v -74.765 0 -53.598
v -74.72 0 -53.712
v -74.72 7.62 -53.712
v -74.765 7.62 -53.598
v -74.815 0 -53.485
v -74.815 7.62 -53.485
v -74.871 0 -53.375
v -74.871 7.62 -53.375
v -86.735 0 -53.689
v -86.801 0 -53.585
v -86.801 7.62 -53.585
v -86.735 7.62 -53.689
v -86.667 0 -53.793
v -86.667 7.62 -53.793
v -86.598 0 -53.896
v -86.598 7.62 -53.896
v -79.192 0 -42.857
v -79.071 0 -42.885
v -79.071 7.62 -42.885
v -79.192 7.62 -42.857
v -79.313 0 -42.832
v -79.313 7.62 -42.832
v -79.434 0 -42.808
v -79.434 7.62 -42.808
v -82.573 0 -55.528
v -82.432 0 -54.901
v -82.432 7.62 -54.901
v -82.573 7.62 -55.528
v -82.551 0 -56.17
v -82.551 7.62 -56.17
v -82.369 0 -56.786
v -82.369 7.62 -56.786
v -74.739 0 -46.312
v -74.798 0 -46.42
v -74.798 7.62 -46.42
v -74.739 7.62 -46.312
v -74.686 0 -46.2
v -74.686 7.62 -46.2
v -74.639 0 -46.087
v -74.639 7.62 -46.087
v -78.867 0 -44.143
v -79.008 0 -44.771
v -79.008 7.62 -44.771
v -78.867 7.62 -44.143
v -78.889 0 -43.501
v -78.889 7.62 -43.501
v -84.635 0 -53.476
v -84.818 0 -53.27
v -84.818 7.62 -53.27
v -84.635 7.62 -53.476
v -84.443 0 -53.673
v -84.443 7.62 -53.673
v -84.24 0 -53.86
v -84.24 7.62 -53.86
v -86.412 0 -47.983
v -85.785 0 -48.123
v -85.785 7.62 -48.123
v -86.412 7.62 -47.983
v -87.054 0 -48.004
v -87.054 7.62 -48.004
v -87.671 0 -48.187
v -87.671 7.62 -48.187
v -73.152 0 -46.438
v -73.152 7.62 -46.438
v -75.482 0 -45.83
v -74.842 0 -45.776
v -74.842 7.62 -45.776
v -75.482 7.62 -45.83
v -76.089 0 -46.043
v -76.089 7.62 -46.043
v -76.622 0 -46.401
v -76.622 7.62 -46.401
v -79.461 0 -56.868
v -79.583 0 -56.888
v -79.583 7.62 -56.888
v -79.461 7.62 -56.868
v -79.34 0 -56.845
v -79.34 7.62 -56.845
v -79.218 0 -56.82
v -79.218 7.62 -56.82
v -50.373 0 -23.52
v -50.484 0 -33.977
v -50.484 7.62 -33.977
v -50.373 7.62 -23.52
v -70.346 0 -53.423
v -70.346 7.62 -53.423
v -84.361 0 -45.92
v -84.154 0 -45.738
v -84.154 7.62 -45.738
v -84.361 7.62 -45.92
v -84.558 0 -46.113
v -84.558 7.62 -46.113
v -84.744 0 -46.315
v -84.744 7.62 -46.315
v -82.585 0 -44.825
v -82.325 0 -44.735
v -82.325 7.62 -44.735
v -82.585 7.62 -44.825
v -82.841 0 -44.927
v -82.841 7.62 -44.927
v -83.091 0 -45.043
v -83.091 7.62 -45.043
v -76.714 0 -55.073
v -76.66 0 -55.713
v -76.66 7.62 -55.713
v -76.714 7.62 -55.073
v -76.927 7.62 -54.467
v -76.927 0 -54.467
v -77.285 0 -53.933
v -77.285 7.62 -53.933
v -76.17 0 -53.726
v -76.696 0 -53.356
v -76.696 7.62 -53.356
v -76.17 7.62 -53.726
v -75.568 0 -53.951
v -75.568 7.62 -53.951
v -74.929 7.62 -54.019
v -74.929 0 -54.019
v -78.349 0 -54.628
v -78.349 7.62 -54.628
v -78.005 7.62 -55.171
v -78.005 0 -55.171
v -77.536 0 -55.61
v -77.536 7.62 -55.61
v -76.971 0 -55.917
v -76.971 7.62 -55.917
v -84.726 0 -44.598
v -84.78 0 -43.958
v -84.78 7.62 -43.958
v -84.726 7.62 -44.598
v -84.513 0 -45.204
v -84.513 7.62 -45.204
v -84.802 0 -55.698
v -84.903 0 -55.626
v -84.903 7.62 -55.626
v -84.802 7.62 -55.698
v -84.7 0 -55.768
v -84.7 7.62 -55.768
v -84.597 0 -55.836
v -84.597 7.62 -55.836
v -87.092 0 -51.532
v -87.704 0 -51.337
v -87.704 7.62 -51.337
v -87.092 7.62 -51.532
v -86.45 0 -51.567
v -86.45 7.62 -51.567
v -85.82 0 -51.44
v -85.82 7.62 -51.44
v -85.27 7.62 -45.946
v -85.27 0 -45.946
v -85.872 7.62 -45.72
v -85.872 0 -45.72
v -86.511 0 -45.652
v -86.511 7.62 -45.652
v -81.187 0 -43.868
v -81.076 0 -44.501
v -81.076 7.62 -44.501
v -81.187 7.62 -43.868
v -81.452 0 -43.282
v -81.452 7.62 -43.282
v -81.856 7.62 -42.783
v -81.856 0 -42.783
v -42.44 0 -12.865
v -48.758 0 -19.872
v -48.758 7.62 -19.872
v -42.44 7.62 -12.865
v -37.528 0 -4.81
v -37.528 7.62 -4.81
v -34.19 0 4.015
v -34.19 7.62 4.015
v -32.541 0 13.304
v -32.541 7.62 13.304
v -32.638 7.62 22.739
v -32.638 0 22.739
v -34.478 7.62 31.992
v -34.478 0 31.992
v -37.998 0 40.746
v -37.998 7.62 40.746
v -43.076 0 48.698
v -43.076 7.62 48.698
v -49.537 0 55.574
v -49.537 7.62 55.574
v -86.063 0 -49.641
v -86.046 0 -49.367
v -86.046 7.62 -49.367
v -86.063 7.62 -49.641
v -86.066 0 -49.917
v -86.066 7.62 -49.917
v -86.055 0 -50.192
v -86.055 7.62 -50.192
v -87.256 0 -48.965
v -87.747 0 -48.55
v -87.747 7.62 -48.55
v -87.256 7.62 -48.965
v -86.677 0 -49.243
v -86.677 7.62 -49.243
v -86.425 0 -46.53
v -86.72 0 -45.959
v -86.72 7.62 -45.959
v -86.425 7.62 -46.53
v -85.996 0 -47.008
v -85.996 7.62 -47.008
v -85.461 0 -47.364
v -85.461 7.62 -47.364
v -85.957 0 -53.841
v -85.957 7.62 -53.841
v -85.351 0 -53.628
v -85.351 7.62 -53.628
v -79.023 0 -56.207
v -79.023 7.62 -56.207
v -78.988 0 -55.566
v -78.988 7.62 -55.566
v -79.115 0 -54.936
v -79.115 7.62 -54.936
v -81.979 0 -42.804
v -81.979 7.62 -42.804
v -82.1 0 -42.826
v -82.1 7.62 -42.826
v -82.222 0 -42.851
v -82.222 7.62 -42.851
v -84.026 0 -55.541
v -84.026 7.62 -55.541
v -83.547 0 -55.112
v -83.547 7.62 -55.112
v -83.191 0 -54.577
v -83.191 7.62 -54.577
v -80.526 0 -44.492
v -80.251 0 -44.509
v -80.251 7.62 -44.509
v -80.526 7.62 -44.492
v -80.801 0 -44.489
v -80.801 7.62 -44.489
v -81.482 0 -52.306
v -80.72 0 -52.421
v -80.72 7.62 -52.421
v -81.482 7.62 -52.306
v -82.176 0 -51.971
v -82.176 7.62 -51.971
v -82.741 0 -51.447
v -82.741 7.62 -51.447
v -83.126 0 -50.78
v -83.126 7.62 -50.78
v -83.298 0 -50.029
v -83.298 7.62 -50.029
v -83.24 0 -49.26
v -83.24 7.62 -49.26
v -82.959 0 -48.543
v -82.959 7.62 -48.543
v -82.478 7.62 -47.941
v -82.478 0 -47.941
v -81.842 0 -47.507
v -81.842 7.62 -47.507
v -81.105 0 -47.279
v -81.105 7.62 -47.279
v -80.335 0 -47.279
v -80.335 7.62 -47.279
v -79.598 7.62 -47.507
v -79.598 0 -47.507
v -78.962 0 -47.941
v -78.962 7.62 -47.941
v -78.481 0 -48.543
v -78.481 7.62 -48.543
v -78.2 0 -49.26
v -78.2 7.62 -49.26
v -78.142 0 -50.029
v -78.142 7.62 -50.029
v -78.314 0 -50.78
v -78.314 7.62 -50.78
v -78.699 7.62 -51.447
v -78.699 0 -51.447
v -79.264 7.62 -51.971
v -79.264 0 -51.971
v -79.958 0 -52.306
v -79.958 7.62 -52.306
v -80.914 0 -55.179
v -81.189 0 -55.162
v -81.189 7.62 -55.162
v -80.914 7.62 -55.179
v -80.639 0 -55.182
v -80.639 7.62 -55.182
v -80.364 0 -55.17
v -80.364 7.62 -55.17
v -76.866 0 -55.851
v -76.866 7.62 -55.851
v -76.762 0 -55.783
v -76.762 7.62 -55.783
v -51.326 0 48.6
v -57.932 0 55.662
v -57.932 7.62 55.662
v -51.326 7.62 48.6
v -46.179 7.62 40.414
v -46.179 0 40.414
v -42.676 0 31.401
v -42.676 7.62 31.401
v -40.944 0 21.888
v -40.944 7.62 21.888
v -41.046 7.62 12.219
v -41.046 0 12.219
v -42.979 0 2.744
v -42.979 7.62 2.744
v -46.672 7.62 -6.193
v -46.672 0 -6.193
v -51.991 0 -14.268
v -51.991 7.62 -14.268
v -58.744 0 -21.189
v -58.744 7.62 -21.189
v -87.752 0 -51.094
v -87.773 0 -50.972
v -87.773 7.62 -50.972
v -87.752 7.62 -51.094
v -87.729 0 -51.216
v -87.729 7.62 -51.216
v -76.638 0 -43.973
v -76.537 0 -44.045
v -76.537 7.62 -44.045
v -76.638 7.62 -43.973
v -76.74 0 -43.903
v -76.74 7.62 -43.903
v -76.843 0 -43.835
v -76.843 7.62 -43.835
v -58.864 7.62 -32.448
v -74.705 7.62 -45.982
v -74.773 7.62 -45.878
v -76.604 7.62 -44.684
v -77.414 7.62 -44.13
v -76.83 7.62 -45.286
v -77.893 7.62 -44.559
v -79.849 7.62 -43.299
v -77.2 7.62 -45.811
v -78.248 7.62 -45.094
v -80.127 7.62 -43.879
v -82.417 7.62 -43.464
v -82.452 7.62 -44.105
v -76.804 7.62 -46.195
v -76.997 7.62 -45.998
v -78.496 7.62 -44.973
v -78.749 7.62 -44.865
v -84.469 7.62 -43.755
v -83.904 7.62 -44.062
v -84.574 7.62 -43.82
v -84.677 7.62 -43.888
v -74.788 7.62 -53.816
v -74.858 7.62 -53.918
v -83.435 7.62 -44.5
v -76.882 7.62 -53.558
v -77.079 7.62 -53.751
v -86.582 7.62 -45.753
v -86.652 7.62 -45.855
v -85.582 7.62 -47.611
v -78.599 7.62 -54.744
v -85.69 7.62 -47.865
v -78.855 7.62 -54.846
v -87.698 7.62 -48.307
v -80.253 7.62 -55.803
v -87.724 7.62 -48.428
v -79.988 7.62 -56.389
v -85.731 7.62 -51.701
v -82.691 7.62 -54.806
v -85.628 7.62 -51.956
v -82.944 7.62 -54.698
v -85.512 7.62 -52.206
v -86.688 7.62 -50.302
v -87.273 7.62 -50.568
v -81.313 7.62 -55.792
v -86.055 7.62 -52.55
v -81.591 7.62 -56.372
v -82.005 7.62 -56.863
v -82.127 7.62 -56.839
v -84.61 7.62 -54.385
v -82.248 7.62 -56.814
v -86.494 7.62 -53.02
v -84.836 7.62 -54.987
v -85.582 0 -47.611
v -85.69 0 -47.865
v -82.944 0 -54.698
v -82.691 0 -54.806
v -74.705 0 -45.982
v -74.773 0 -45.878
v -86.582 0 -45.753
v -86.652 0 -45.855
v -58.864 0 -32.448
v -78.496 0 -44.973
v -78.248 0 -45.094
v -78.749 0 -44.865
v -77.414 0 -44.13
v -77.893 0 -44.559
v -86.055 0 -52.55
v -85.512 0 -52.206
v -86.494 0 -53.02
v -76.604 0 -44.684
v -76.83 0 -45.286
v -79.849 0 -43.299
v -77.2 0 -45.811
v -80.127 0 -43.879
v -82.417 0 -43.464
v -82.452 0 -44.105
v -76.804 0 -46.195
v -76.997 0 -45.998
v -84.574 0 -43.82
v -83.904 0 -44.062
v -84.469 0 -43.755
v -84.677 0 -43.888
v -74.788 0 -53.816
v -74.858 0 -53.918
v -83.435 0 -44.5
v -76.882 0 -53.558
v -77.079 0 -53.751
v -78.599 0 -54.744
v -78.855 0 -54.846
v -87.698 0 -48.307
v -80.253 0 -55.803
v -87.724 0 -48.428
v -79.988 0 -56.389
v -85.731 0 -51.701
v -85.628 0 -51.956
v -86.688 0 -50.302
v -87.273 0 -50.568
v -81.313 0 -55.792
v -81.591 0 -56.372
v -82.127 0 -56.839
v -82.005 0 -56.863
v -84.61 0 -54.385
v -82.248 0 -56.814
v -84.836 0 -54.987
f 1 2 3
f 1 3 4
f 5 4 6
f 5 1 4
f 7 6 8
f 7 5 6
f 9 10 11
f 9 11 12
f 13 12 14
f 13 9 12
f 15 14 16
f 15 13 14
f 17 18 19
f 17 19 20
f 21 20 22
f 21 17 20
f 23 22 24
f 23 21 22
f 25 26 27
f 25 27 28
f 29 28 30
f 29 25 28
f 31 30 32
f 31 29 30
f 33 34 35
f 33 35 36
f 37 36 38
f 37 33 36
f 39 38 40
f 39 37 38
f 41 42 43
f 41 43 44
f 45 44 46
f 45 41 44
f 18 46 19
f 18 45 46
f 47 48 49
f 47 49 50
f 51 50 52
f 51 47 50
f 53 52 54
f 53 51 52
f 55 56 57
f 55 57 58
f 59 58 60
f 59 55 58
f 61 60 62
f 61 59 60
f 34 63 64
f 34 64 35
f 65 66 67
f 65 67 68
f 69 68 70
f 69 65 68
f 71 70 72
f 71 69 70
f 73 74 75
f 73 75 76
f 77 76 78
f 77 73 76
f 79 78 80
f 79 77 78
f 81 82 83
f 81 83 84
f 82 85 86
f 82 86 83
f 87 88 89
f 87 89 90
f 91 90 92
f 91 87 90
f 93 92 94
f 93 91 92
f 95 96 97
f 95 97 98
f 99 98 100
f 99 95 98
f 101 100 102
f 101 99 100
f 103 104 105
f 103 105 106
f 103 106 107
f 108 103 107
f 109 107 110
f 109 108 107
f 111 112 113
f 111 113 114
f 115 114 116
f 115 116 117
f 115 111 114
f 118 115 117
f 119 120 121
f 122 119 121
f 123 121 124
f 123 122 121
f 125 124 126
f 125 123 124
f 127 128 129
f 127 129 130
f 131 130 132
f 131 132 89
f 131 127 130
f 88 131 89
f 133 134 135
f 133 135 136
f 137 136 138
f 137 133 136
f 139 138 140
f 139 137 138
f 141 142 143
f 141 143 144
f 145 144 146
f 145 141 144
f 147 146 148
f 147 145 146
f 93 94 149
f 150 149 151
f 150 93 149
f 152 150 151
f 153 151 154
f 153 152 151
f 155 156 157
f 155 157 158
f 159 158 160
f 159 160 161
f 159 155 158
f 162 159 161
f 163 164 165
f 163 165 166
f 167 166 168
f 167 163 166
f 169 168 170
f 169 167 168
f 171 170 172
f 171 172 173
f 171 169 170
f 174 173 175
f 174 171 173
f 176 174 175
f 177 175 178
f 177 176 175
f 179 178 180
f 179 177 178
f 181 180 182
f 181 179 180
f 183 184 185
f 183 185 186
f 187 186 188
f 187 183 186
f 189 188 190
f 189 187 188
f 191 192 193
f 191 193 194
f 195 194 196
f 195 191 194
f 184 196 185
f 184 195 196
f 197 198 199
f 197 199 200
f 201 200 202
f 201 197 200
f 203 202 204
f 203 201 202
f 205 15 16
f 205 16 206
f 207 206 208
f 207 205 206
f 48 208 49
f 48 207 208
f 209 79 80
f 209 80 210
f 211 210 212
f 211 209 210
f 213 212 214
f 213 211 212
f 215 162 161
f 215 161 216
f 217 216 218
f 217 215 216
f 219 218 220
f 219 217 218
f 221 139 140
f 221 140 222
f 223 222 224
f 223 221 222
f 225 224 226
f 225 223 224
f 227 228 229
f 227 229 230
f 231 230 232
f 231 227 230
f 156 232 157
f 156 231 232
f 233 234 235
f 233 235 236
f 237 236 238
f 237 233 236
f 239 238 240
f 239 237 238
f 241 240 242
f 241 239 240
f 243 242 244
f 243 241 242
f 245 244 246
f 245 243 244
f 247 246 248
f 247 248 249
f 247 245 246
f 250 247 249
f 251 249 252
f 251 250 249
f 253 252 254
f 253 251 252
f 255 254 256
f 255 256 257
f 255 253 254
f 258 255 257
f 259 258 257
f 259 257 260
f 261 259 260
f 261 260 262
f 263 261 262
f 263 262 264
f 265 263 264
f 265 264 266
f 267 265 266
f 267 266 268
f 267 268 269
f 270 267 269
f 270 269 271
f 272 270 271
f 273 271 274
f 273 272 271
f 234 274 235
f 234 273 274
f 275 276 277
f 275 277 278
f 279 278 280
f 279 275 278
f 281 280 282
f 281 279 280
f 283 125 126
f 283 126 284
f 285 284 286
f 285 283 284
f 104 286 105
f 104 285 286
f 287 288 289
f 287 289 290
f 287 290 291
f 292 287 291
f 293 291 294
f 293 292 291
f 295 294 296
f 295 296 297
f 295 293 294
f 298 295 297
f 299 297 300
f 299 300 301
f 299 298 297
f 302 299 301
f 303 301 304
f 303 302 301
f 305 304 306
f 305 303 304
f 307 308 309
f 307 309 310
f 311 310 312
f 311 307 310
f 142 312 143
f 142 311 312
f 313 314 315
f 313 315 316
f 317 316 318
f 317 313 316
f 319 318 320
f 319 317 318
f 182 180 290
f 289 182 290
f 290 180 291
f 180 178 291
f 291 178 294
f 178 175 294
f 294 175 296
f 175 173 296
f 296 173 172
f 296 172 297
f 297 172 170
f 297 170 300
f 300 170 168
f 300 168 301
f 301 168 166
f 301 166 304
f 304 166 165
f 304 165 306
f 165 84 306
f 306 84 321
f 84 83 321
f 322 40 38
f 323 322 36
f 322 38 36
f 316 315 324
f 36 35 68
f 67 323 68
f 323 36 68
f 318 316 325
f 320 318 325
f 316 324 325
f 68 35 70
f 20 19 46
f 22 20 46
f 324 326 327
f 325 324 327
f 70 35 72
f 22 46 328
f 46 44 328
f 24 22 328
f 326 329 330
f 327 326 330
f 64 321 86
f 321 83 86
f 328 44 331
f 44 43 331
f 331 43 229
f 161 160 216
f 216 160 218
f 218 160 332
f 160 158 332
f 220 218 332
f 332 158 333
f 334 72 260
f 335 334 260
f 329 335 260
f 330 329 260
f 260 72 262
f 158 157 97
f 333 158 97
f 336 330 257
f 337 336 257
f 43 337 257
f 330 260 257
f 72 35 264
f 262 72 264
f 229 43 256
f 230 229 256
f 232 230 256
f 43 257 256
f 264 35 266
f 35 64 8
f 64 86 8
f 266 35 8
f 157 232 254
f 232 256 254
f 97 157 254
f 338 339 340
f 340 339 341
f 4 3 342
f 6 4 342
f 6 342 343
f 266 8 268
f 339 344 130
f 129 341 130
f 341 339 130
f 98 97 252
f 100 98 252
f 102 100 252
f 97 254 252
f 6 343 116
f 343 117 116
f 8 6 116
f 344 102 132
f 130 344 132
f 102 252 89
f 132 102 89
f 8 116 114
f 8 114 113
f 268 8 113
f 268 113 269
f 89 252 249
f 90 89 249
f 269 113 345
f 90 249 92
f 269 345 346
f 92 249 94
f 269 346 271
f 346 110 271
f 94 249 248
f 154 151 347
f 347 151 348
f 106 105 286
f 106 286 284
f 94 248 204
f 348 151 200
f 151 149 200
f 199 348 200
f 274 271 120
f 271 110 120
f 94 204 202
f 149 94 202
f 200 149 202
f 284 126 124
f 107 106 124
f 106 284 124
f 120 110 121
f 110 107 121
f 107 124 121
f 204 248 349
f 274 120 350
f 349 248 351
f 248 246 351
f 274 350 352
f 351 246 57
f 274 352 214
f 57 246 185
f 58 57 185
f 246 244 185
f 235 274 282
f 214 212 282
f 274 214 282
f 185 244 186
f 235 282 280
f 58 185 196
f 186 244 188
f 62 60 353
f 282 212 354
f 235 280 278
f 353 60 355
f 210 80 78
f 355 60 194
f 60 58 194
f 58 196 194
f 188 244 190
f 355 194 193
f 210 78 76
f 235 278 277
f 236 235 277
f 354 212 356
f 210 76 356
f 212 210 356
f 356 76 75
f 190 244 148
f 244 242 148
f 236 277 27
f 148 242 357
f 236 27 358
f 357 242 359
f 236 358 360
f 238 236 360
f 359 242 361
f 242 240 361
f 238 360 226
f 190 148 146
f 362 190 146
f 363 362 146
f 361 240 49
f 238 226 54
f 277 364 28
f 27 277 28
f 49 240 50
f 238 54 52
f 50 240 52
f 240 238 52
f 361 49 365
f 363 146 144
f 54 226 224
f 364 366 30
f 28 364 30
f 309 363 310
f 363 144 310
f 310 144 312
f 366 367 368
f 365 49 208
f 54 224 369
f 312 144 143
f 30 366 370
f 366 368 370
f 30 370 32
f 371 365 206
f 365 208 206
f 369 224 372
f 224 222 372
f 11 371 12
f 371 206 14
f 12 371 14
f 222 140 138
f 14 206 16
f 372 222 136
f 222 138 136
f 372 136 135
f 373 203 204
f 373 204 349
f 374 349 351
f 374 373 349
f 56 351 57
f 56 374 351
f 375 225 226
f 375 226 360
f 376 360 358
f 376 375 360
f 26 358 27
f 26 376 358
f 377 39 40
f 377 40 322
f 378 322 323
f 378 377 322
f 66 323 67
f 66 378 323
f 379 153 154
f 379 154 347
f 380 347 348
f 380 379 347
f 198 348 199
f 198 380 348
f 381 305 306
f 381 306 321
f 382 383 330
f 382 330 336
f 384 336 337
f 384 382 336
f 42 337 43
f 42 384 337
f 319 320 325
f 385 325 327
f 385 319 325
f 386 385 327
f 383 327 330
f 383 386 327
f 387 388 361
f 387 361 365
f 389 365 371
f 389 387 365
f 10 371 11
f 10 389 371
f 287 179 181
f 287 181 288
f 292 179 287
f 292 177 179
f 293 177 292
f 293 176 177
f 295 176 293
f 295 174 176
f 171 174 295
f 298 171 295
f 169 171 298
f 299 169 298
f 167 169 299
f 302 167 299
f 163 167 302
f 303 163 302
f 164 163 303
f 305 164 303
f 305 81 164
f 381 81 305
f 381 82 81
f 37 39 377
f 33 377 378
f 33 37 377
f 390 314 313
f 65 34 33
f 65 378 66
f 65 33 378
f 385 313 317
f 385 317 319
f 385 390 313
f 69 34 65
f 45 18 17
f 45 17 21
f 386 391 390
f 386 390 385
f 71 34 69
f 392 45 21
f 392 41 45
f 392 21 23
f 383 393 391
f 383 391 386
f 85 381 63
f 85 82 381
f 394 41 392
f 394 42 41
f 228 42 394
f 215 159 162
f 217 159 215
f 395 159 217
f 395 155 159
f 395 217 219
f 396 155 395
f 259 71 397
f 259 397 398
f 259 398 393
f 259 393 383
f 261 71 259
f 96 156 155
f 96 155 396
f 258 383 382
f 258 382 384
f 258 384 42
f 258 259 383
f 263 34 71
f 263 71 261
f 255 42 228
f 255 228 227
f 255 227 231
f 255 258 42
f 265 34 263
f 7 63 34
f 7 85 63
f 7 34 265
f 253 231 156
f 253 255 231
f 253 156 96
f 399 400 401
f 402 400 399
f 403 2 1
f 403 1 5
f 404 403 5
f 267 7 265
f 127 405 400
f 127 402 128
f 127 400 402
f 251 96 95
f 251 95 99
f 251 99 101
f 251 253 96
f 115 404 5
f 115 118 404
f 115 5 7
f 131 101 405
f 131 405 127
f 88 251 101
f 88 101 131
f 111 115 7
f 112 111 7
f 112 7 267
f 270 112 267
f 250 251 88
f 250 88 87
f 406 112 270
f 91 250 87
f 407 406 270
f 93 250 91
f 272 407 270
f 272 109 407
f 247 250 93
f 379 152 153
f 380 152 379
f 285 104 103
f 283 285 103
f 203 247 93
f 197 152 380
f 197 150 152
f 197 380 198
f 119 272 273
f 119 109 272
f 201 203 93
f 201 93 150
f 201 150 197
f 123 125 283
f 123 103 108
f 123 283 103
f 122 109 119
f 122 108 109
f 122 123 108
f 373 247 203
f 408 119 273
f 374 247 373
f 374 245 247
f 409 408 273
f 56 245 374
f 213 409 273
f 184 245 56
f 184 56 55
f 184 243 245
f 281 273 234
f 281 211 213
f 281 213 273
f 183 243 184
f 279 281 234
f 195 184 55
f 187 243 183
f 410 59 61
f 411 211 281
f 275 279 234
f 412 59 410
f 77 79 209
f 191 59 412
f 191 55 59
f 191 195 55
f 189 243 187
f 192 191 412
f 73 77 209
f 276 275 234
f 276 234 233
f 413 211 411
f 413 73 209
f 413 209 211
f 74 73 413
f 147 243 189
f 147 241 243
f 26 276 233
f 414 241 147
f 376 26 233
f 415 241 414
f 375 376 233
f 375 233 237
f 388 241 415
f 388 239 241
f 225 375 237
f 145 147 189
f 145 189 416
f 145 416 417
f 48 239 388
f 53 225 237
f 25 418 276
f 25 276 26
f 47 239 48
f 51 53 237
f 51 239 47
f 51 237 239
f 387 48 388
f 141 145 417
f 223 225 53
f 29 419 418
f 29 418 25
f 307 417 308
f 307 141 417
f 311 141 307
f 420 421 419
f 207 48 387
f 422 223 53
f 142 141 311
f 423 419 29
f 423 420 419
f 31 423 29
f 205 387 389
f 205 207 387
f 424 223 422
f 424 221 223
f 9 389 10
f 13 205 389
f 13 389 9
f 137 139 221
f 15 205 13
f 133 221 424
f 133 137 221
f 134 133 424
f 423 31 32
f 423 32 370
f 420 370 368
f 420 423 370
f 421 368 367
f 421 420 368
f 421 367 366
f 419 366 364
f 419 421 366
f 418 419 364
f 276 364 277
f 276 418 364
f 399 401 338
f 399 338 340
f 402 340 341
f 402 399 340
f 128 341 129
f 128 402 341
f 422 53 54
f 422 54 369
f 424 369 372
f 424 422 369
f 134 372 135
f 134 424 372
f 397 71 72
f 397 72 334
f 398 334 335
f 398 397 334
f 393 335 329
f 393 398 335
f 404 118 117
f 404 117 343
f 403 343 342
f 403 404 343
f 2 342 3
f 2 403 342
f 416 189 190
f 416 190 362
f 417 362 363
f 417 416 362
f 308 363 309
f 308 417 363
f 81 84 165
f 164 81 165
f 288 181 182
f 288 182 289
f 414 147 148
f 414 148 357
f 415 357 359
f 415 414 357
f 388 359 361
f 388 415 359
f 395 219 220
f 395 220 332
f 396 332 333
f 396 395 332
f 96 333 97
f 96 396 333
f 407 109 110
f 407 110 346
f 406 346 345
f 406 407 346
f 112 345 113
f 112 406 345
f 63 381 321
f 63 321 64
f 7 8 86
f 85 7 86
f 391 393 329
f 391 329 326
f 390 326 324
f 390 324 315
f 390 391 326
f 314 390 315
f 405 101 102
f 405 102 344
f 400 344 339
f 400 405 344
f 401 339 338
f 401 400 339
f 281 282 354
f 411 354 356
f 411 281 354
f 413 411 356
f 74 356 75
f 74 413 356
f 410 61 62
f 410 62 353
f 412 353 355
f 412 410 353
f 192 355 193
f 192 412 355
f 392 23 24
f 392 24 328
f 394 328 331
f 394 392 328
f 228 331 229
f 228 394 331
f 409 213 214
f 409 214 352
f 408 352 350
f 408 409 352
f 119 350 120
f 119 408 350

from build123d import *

# Parameters (mm, degrees)
SKETCH1_R           = 2.585044133
BOSS_EXTRUDE1_DEPTH = 7.62


with BuildPart() as part:
    # Sketch1 → Boss-Extrude1 (new body)
    with BuildSketch(Plane(origin=(0, 0, 0), x_dir=(1, 0, 0), z_dir=(0, 1, 0))):
        with BuildLine():
            Line((-58.744472787, 21.18875714), (-58.863577215, 32.44818208))
            Line((-58.863577215, 32.44818208), (-73.152298059, 46.437769379))
            Line((-73.152298059, 46.437769379), (-74.797762466, 46.42036333))
            ThreePointArc((-74.797762466, 46.42036333), (-74.712288392, 46.256361266), (-74.638974072, 46.086574622))
            ThreePointArc((-74.638974072, 46.086574622), (-74.738493774, 45.929751081), (-74.84205687, 45.775567815))
            ThreePointArc((-74.84205687, 45.775567815), (-75.79237137, 45.916884294), (-76.622213572, 46.401063925))
            ThreePointArc((-76.622213572, 46.401063925), (-76.899486556, 46.095069224), (-77.199547344, 45.811385265))
            ThreePointArc((-77.199547344, 45.811385265), (-76.697921552, 44.991971107), (-76.536533716, 44.044858674))
            ThreePointArc((-76.536533716, 44.044858674), (-76.688491702, 43.938057155), (-76.843174908, 43.835242273))
            ThreePointArc((-76.843174908, 43.835242273), (-77.667071549, 44.32947129), (-78.248458251, 45.094361803))
            ThreePointArc((-78.248458251, 45.094361803), (-78.621724189, 44.917767339), (-79.00750536, 44.770505828))
            ThreePointArc((-79.00750536, 44.770505828), (-78.857639781, 43.82150198), (-79.070981099, 42.884723736))
            ThreePointArc((-79.070981099, 42.884723736), (-79.252243144, 42.844203803), (-79.434497344, 42.808409938))
            ThreePointArc((-79.434497344, 42.808409938), (-80.00654533, 43.580309605), (-80.250965679, 44.509463354))
            ThreePointArc((-80.250965679, 44.509463354), (-80.663398214, 44.489154033), (-81.076168083, 44.5007342))
            ThreePointArc((-81.076168083, 44.5007342), (-81.300878392, 43.566617894), (-81.856469582, 42.782789835))
            ThreePointArc((-81.856469582, 42.782789835), (-82.039440183, 42.81472028), (-82.221518827, 42.851396724))
            ThreePointArc((-82.221518827, 42.851396724), (-82.454629039, 43.783452315), (-82.32487225, 44.735414064))
            ThreePointArc((-82.32487225, 44.735414064), (-82.713682269, 44.874481796), (-83.090600365, 45.043140665))
            ThreePointArc((-83.090600365, 45.043140665), (-83.655676454, 44.266122641), (-84.468933795, 43.754575485))
            ThreePointArc((-84.468933795, 43.754575485), (-84.625757336, 43.854095187), (-84.779940601, 43.957658283))
            ThreePointArc((-84.779940601, 43.957658283), (-84.638624122, 44.907972782), (-84.154444491, 45.737814985))
            ThreePointArc((-84.154444491, 45.737814985), (-84.460439193, 46.015087969), (-84.744123152, 46.315148756))
            ThreePointArc((-84.744123152, 46.315148756), (-85.563537309, 45.813522965), (-86.510649743, 45.652135128))
            ThreePointArc((-86.510649743, 45.652135128), (-86.617451261, 45.804093115), (-86.720266143, 45.958776321))
            ThreePointArc((-86.720266143, 45.958776321), (-86.226037126, 46.782672961), (-85.461146613, 47.364059664))
            ThreePointArc((-85.461146613, 47.364059664), (-85.637741078, 47.737325602), (-85.785002589, 48.123106773))
            ThreePointArc((-85.785002589, 48.123106773), (-86.734006437, 47.973241194), (-87.670784681, 48.186582511))
            ThreePointArc((-87.670784681, 48.186582511), (-87.711304614, 48.367844557), (-87.747098479, 48.550098756))
            ThreePointArc((-87.747098479, 48.550098756), (-86.975198811, 49.122146743), (-86.046045062, 49.366567091))
            ThreePointArc((-86.046045062, 49.366567091), (-86.066354384, 49.778999627), (-86.054774217, 50.191769496))
            ThreePointArc((-86.054774217, 50.191769496), (-86.988890523, 50.416479804), (-87.772718581, 50.972070995))
            ThreePointArc((-87.772718581, 50.972070995), (-87.740788136, 51.155041596), (-87.704111693, 51.33712024))
            ThreePointArc((-87.704111693, 51.33712024), (-86.772056102, 51.570230452), (-85.820094353, 51.440473663))
            ThreePointArc((-85.820094353, 51.440473663), (-85.681026621, 51.829283682), (-85.512367752, 52.206201778))
            ThreePointArc((-85.512367752, 52.206201778), (-86.289385775, 52.771277867), (-86.800932932, 53.584535208))
            ThreePointArc((-86.800932932, 53.584535208), (-86.701413229, 53.741358749), (-86.597850134, 53.895542014))
            ThreePointArc((-86.597850134, 53.895542014), (-85.647535634, 53.754225535), (-84.817693432, 53.270045904))
            ThreePointArc((-84.817693432, 53.270045904), (-84.540420448, 53.576040606), (-84.24035966, 53.859724565))
            ThreePointArc((-84.24035966, 53.859724565), (-84.741985451, 54.679138722), (-84.903373288, 55.626251155))
            ThreePointArc((-84.903373288, 55.626251155), (-84.751415301, 55.733052674), (-84.596732096, 55.835867556))
            ThreePointArc((-84.596732096, 55.835867556), (-83.772835455, 55.341638539), (-83.191448752, 54.576748026))
            ThreePointArc((-83.191448752, 54.576748026), (-82.818182815, 54.75334249), (-82.432401643, 54.900604001))
            ThreePointArc((-82.432401643, 54.900604001), (-82.582267223, 55.84960785), (-82.368925905, 56.786386093))
            ThreePointArc((-82.368925905, 56.786386093), (-82.18766386, 56.826906026), (-82.00540966, 56.862699892))
            ThreePointArc((-82.00540966, 56.862699892), (-81.433361673, 56.090800224), (-81.188941325, 55.161646475))
            ThreePointArc((-81.188941325, 55.161646475), (-80.77650879, 55.181955796), (-80.363738921, 55.17037563))
            ThreePointArc((-80.363738921, 55.17037563), (-80.139028612, 56.104491936), (-79.583437422, 56.888319994))
            ThreePointArc((-79.583437422, 56.888319994), (-79.400466821, 56.856389549), (-79.218388177, 56.819713106))
            ThreePointArc((-79.218388177, 56.819713106), (-78.985277965, 55.887657515), (-79.115034753, 54.935695766))
            ThreePointArc((-79.115034753, 54.935695766), (-78.726224734, 54.796628034), (-78.349306639, 54.627969164))
            ThreePointArc((-78.349306639, 54.627969164), (-77.78423055, 55.404987188), (-76.970973209, 55.916534344))
            ThreePointArc((-76.970973209, 55.916534344), (-76.814149668, 55.817014642), (-76.659966403, 55.713451547))
            ThreePointArc((-76.659966403, 55.713451547), (-76.801282881, 54.763137047), (-77.285462512, 53.933294844))
            ThreePointArc((-77.285462512, 53.933294844), (-76.979467811, 53.656021861), (-76.695783852, 53.355961073))
            ThreePointArc((-76.695783852, 53.355961073), (-75.876369695, 53.857586864), (-74.929257261, 54.018974701))
            ThreePointArc((-74.929257261, 54.018974701), (-74.822455743, 53.867016714), (-74.71964086, 53.712333509))
            ThreePointArc((-74.71964086, 53.712333509), (-74.789347103, 53.541033964), (-74.871332746, 53.375260478))
            Line((-74.871332746, 53.375260478), (-70.346139099, 53.423128873))
            Line((-70.346139099, 53.423128873), (-50.484046566, 33.9768481))
            Line((-50.484046566, 33.9768481), (-50.373431547, 23.519961391))
            Line((-50.373431547, 23.519961391), (-48.757825737, 19.872187168))
            ThreePointArc((-48.757825737, 19.872187168), (-32.369822631, -18.023926027), (-49.536764273, -55.573601869))
            Line((-49.536764273, -55.573601869), (-57.931525987, -55.662403321))
            ThreePointArc((-57.931525987, -55.662403321), (-40.764719029, -17.050929449), (-58.744472787, 21.18875714))
        make_face()
        with Locations(Location((-80.719953502, 49.835554915, 0), (0, 0, 90))):
            Circle(SKETCH1_R, mode=Mode.SUBTRACT)
    extrude(amount=BOSS_EXTRUDE1_DEPTH)


solid = part.part
